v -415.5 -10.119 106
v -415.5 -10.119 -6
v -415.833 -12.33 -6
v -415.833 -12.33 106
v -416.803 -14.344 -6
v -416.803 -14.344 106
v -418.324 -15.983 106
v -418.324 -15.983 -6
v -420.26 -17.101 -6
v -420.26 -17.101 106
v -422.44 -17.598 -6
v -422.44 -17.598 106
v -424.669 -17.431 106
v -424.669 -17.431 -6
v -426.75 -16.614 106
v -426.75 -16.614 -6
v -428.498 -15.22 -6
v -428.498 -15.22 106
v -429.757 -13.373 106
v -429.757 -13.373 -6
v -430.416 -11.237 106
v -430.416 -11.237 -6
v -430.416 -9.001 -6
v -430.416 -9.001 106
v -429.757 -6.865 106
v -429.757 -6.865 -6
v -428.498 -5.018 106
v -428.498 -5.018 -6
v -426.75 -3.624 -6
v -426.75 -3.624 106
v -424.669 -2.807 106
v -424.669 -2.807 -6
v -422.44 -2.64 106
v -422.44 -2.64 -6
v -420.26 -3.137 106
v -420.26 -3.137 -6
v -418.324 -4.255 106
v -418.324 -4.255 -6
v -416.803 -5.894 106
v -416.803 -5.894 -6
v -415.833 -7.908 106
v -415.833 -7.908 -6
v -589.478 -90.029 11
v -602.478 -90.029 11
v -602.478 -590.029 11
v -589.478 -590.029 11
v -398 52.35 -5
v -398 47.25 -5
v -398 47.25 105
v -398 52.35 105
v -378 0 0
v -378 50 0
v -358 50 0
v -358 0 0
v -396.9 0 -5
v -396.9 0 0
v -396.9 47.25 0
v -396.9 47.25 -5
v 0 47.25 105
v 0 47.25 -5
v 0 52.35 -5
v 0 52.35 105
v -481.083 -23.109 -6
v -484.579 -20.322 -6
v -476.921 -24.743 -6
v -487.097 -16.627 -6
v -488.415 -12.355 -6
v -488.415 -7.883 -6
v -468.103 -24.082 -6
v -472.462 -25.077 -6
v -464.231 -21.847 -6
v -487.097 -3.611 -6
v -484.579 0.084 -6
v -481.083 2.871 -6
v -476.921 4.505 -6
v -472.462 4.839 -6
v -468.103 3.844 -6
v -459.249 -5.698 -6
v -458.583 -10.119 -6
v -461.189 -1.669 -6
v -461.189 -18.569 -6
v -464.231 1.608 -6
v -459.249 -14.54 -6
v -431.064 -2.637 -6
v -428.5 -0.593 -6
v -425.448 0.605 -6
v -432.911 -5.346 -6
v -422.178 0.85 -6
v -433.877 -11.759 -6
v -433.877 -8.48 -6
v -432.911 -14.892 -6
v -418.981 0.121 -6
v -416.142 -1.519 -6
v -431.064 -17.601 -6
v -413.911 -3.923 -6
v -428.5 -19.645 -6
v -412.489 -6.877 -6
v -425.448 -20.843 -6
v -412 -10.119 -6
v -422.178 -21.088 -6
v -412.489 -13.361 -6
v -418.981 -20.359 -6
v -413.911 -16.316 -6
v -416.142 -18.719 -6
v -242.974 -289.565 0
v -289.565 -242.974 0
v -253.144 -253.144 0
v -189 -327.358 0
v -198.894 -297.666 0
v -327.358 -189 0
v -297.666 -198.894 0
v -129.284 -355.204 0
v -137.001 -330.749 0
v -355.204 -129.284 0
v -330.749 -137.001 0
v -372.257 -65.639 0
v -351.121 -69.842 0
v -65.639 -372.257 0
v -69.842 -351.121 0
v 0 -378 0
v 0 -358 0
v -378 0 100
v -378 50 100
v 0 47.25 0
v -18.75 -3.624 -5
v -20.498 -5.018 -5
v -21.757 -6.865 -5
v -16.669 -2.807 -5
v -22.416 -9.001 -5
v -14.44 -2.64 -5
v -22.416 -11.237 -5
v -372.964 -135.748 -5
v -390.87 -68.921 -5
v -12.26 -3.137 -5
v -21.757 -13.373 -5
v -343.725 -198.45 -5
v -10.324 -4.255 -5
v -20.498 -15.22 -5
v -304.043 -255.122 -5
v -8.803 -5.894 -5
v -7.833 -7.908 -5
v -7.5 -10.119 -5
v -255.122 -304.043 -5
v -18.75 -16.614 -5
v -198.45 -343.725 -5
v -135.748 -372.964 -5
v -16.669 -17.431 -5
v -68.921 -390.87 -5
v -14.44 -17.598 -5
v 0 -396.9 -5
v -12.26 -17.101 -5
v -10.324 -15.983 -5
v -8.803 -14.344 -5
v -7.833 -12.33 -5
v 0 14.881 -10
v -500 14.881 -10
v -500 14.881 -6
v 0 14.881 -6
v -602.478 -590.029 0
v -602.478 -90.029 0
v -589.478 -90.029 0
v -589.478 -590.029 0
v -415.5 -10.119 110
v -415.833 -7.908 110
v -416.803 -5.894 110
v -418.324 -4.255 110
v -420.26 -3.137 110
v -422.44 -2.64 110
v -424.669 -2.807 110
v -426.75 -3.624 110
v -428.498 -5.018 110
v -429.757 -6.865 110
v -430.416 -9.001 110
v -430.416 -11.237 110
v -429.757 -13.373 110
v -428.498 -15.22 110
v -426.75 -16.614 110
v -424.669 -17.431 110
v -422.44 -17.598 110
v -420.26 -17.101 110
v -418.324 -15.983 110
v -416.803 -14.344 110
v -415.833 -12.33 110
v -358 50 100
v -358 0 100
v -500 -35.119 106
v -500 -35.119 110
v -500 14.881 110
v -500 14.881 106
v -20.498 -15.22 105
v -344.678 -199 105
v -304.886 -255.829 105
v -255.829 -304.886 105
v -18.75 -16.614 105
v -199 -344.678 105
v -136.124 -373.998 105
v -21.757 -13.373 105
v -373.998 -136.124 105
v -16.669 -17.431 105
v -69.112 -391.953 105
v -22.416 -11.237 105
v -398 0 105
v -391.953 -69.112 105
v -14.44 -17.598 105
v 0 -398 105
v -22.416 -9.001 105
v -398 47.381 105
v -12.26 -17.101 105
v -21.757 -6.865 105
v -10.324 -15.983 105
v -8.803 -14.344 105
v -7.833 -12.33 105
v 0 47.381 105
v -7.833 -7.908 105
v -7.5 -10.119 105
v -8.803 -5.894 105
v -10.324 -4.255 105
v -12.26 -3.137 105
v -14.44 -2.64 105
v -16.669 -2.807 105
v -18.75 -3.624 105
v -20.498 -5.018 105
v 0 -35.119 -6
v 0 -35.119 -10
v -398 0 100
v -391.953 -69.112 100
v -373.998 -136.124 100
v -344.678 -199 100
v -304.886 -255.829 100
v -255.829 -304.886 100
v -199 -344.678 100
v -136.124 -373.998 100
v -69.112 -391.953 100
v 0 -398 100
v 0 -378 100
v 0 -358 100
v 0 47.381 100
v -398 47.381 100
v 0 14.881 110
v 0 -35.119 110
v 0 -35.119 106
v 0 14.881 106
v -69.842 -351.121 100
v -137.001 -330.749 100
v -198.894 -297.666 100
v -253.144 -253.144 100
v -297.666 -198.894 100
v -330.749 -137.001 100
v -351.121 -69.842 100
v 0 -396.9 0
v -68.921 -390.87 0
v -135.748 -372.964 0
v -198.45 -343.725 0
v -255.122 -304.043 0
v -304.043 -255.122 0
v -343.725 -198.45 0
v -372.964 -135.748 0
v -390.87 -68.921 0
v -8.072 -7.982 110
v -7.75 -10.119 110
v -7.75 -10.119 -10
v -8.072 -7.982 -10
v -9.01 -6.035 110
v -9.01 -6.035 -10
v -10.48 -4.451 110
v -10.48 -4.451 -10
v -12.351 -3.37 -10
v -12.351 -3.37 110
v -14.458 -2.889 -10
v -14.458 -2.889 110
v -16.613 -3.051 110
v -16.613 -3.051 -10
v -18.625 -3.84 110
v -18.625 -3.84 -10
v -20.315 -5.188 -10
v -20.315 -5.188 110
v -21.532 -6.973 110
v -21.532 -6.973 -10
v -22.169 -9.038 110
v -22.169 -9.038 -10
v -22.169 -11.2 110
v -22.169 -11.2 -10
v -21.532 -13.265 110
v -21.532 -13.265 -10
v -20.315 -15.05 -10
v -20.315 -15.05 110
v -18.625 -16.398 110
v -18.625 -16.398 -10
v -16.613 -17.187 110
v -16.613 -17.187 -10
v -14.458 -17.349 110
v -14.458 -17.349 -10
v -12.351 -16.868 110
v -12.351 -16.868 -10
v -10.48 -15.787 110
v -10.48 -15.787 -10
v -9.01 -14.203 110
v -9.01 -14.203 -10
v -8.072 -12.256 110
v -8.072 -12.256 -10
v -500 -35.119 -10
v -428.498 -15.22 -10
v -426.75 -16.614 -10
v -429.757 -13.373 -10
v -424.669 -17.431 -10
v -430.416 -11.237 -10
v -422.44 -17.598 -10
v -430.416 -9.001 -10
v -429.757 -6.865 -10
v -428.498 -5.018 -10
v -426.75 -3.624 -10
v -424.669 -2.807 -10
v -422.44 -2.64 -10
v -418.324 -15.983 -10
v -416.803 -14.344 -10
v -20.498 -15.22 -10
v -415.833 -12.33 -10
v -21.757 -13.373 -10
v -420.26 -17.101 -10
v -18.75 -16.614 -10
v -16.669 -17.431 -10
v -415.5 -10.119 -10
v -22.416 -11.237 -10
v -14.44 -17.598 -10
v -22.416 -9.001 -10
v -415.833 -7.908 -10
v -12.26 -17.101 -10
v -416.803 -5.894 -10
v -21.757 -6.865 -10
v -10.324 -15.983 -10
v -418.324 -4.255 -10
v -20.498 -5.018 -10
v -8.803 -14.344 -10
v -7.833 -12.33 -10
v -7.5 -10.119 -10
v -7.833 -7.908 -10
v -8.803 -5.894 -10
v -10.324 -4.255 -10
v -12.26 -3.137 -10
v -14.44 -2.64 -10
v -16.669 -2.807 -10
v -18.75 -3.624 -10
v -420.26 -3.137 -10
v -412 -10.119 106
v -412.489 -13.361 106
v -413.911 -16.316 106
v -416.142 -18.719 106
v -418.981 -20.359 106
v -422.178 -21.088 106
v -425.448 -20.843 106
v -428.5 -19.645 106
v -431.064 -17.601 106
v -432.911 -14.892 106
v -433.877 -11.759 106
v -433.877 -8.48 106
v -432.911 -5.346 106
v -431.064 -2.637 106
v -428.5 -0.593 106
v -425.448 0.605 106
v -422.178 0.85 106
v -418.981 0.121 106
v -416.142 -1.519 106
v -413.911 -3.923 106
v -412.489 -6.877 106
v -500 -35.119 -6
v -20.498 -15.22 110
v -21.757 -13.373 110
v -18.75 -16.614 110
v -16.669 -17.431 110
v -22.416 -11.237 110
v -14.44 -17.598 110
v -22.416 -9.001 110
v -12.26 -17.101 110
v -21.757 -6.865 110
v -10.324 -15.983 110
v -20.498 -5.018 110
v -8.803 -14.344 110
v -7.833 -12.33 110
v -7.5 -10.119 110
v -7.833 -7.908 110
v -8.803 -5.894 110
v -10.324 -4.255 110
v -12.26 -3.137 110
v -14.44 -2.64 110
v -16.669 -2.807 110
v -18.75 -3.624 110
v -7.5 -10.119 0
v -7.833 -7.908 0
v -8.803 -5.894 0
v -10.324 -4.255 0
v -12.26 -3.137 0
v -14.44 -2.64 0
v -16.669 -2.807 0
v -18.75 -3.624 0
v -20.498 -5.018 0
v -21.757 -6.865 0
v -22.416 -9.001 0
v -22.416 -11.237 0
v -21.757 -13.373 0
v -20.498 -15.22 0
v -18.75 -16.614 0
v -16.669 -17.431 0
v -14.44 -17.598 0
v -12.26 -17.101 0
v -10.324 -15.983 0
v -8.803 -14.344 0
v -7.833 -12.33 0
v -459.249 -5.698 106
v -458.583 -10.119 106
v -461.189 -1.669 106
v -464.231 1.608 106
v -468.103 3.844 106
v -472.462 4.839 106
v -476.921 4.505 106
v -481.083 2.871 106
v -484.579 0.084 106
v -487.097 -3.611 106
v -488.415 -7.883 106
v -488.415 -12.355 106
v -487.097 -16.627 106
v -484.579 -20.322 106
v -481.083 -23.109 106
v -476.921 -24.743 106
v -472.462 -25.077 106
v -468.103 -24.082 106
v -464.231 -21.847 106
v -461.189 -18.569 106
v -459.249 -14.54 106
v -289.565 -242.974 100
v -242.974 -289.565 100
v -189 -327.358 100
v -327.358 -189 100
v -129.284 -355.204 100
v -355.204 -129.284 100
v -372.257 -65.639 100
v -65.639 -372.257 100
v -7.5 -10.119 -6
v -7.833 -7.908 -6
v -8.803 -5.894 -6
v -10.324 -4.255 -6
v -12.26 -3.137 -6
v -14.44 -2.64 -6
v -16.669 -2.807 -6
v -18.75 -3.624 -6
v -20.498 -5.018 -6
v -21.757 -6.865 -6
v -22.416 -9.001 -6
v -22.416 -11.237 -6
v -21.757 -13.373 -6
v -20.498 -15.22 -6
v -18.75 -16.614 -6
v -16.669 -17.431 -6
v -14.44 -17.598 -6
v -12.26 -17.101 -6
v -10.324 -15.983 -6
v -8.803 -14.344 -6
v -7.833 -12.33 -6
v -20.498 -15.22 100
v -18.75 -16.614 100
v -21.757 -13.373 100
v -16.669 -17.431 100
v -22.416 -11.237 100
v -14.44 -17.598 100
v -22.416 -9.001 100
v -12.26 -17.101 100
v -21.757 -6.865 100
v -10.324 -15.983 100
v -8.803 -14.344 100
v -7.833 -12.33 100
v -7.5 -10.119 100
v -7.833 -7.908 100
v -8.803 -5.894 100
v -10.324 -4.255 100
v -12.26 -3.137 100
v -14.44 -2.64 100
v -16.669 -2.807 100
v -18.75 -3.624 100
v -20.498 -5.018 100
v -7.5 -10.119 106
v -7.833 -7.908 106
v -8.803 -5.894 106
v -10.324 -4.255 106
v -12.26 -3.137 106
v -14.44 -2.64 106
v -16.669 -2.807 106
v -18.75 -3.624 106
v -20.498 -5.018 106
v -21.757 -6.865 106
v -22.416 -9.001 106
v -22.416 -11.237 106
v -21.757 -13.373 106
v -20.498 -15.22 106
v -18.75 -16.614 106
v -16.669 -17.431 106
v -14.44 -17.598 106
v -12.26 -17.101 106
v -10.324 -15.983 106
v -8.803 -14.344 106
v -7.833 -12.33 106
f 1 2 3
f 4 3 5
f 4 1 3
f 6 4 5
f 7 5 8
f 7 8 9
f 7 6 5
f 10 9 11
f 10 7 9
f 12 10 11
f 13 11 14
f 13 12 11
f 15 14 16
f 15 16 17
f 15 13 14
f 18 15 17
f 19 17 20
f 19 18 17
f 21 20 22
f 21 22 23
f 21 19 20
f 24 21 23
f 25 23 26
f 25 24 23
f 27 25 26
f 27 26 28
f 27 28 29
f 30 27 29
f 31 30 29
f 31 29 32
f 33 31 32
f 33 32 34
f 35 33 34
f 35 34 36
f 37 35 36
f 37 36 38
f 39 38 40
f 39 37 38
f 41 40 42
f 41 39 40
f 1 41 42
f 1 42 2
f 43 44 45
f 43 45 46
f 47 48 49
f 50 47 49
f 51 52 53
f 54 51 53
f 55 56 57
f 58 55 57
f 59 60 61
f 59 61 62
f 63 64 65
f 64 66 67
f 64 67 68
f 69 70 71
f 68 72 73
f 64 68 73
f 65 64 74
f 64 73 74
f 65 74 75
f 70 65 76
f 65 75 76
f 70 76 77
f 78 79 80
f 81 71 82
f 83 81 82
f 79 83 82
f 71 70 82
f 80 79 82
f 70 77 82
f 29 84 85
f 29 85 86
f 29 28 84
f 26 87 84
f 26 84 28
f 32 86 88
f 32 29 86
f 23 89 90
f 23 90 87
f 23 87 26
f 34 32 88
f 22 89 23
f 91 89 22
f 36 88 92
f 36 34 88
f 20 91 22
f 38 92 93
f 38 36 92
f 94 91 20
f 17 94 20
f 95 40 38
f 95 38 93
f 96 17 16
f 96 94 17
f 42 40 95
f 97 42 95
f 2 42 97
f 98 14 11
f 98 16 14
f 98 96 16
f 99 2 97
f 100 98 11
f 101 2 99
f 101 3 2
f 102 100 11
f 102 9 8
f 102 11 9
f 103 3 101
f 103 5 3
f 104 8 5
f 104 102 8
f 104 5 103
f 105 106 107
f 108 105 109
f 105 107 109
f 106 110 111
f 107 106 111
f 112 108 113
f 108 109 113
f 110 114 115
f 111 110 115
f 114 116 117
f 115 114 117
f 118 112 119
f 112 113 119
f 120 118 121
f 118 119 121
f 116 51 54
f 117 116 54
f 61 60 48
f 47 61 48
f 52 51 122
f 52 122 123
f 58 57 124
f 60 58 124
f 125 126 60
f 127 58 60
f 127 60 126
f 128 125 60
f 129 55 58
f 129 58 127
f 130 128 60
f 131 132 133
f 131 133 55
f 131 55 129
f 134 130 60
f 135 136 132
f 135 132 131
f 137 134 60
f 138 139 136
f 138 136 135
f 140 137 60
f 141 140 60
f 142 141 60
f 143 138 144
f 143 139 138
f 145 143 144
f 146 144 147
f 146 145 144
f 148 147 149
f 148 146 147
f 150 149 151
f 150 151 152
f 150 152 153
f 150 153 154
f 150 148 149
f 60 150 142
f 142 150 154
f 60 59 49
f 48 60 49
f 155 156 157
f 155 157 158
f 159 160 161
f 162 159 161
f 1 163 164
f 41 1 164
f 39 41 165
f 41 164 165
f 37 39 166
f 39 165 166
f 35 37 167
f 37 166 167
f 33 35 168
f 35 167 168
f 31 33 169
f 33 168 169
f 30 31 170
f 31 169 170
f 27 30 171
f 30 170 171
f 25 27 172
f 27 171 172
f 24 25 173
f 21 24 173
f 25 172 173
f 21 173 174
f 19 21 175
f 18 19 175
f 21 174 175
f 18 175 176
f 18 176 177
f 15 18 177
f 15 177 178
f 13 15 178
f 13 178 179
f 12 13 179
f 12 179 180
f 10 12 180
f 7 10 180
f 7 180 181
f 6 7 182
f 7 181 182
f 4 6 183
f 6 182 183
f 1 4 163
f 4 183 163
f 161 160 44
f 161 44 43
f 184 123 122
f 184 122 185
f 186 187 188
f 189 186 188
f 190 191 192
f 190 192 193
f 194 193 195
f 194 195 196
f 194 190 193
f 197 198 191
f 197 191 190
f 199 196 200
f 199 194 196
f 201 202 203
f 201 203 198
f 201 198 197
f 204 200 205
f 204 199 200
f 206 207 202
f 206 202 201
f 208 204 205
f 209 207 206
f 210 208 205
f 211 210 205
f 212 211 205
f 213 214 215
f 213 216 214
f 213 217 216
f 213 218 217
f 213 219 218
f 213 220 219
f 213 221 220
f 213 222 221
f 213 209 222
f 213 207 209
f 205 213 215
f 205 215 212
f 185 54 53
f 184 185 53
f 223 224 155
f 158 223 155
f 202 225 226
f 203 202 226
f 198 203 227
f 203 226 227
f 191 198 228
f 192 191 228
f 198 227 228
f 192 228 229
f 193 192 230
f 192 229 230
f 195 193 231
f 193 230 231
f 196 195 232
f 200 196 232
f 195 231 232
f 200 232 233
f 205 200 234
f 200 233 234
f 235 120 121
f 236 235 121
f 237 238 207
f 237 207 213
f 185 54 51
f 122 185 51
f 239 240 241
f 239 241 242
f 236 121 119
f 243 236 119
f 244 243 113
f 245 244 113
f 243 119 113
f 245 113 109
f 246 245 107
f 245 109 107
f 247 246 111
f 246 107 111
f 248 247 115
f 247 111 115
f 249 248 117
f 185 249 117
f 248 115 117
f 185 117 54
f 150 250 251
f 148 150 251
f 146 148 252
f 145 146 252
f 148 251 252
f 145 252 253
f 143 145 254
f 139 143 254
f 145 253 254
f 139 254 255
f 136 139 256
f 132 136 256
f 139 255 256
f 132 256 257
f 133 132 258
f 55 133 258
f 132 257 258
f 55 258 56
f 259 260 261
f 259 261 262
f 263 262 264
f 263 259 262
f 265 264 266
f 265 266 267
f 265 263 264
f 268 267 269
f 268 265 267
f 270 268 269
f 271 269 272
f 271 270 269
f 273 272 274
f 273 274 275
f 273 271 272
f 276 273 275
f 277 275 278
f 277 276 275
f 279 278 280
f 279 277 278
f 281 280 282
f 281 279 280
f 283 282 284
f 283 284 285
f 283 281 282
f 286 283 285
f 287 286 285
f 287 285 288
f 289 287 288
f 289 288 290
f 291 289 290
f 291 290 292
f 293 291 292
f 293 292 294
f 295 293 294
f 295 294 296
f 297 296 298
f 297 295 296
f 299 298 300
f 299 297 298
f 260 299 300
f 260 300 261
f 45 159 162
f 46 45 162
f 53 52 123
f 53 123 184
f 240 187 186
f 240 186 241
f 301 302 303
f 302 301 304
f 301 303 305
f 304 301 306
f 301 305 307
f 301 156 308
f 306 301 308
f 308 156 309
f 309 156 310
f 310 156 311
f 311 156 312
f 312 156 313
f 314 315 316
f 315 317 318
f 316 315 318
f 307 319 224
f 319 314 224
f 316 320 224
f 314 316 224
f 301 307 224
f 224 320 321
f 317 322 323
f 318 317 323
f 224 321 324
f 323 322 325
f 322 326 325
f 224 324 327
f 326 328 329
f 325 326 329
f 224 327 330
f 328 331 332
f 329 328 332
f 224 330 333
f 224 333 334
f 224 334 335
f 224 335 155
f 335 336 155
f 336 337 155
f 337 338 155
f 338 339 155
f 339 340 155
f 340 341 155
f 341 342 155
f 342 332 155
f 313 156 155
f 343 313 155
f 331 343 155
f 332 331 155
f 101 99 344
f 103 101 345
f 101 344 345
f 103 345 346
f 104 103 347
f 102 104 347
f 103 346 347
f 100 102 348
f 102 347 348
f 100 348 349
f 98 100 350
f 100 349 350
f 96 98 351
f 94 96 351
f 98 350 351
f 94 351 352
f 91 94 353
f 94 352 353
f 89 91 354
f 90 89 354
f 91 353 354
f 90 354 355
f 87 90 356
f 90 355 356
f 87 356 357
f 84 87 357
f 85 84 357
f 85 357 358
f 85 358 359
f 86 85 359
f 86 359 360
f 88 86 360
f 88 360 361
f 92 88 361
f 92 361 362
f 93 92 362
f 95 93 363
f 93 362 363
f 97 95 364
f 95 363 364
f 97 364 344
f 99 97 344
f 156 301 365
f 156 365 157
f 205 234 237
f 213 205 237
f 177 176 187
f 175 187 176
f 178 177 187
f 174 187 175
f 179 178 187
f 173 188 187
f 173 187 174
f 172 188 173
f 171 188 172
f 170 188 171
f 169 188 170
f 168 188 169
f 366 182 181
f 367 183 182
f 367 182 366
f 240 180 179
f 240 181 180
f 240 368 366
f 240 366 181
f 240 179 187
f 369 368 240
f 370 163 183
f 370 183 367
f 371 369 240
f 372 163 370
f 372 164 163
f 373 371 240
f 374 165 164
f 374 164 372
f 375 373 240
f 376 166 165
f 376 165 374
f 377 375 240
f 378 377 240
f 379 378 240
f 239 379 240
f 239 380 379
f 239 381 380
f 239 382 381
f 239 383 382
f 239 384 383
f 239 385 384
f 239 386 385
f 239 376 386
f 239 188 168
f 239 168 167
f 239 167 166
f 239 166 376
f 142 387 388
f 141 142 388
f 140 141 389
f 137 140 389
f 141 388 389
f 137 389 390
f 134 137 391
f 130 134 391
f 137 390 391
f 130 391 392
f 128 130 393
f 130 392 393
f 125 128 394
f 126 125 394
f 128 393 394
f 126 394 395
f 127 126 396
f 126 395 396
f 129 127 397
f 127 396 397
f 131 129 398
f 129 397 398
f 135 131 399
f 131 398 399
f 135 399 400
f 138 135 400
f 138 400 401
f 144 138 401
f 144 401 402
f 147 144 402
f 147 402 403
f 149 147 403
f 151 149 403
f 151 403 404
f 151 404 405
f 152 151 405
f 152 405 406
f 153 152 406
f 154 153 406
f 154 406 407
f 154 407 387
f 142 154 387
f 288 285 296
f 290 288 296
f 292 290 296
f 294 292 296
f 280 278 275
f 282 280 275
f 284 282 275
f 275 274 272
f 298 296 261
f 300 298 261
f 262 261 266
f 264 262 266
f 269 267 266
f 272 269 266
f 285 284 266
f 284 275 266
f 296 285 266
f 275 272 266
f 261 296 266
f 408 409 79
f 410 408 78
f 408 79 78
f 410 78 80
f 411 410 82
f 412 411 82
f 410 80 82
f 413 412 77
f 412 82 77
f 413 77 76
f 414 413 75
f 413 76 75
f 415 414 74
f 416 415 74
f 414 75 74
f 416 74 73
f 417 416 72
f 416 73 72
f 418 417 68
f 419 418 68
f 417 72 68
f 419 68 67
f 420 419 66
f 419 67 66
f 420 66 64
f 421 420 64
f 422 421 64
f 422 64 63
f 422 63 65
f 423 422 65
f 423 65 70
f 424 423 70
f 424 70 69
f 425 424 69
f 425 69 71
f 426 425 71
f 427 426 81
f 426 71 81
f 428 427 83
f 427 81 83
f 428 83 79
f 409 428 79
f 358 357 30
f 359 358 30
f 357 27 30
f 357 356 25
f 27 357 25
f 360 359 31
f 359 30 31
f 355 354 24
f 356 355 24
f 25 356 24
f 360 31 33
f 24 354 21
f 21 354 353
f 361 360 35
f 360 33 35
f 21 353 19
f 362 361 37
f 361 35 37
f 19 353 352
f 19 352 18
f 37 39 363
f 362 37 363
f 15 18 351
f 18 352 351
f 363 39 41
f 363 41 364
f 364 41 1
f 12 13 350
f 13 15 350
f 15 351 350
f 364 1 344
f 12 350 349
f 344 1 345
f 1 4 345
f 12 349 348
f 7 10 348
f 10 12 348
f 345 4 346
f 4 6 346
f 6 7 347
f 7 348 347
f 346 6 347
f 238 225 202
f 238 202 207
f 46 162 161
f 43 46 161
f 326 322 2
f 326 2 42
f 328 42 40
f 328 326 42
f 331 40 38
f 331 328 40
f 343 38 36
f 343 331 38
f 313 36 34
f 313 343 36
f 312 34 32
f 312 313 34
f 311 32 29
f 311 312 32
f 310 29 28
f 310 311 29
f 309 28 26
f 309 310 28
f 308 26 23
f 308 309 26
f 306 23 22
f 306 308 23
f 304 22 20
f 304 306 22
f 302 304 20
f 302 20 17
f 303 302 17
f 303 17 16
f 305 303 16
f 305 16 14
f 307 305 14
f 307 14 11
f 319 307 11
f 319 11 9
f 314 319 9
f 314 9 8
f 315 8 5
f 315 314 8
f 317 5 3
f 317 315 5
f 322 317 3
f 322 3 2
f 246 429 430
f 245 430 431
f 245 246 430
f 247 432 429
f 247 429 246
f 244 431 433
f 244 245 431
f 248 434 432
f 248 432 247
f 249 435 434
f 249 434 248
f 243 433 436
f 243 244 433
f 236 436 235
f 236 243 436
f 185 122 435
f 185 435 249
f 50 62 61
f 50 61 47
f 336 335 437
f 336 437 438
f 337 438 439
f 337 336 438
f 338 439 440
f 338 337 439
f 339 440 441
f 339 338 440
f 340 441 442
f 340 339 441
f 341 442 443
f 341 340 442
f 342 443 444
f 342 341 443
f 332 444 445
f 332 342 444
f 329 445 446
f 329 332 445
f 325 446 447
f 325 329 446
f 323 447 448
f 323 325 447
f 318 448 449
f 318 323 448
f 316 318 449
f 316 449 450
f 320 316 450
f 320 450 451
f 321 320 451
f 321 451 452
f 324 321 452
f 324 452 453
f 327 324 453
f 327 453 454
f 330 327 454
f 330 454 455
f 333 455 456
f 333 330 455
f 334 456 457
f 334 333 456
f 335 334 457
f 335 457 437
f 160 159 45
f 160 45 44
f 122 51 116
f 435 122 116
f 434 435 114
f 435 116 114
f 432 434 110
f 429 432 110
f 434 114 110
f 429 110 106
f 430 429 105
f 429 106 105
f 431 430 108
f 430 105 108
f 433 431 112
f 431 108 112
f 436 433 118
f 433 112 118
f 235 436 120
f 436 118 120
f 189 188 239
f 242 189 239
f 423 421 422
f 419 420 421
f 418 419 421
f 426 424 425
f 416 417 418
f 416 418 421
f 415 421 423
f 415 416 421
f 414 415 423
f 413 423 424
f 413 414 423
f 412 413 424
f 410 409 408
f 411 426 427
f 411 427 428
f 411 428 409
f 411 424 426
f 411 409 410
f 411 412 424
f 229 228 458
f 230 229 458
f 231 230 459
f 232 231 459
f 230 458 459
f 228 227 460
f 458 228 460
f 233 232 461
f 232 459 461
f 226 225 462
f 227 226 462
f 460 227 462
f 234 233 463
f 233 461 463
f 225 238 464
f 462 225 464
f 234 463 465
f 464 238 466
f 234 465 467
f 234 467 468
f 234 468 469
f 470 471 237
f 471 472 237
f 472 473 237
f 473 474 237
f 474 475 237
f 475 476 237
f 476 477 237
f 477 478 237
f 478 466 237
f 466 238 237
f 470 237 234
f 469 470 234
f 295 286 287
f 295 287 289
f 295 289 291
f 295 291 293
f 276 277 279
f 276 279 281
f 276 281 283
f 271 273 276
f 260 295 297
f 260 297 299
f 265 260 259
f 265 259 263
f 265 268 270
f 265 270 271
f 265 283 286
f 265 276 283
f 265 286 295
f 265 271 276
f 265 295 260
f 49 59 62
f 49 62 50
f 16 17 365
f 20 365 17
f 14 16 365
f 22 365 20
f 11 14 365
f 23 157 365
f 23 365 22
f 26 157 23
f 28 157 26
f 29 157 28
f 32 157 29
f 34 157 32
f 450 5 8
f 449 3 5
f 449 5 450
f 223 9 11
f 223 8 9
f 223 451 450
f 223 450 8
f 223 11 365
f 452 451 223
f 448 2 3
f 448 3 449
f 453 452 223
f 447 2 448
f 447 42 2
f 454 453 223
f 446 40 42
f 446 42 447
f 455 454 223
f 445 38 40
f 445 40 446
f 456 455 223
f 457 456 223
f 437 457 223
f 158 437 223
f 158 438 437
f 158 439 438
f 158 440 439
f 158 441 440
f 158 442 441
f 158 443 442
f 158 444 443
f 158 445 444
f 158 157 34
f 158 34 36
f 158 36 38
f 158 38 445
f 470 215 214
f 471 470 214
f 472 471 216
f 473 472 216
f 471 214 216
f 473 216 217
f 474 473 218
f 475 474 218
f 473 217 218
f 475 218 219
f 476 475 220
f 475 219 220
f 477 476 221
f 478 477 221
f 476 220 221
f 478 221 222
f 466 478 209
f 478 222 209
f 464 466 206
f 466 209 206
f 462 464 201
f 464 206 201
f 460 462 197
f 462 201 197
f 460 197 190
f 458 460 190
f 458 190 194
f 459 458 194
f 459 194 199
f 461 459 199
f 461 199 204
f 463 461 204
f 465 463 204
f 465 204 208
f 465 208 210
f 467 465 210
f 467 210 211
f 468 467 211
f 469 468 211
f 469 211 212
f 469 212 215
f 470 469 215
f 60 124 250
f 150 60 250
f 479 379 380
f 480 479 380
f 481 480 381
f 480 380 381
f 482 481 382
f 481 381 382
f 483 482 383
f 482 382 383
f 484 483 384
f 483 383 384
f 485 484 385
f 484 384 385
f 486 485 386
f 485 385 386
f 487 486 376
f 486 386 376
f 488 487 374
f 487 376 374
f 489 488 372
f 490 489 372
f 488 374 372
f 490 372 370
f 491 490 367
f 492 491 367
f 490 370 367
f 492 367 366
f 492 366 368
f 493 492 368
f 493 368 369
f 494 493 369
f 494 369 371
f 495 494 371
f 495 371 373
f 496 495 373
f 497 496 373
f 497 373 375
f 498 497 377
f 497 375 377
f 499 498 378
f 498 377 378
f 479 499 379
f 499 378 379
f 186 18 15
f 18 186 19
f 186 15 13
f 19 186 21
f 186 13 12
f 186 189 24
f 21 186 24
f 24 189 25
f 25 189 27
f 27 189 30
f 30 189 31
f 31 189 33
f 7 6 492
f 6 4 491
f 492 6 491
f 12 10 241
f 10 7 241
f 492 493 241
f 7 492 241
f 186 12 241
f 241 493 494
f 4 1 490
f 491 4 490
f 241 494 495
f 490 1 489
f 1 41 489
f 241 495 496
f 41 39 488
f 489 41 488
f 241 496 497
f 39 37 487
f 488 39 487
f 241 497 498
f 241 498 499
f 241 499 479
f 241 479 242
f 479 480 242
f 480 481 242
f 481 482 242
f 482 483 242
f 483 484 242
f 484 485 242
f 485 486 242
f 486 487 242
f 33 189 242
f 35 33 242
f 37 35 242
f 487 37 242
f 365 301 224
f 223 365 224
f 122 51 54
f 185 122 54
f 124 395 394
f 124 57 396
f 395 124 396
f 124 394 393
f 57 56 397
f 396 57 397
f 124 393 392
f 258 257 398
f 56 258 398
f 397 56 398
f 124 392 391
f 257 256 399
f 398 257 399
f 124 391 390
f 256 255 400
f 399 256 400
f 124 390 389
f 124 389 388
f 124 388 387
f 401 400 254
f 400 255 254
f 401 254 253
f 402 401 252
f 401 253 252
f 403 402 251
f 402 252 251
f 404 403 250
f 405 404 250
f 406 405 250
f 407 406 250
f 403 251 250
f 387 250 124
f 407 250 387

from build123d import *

# Parameters (mm, degrees)
F1_DEPTH  = 100
F4_DEPTH  = 5
F6_W      = 398
F6_H      = 47.380952381
F7_DEPTH  = 5
F9_W      = 398
F9_H      = 110
F10_DEPTH = 5.1
F11_R     = 7.5
F12_DEPTH = 110.001
F14_R     = 7.25
F15_DEPTH = 120
F17_W     = 500
F17_H     = 50
F17_R     = 7.5
F18_DEPTH = 4
F0_W      = 20
F0_H      = 50
F21_DEPTH = 100
F22_R     = 15
F23_DEPTH = 112
F24_R     = 11
F24_R_2   = 7.5
F25_DEPTH = 112
F26_W     = 13
F26_H     = 500
F27_DEPTH = 11


# Not quite as in the source:
# - a feature names something its author has since deleted; it is built from what else it names


with BuildPart() as f1:
    # F0 (on Top) → F1 (new body)
    with BuildSketch(Plane.XY):
        with BuildLine():
            ThreePointArc((0, -358), (-253.1442276648, -253.1442276648), (-358, 0))
            Line((-358, 0), (-378, 0))
            ThreePointArc((-378, 0), (-267.2863632885, -267.2863632885), (0, -378))
            Line((0, -378), (0, -358))
        make_face()
    extrude(amount=F1_DEPTH)


with BuildPart() as f4:
    # F3 (on offset) → F4 (new body)
    with BuildSketch(Plane(origin=(0, 0, 0), x_dir=(1, 0, 0), z_dir=(0, 0, -1))):
        with BuildLine():
            Line((-378, 0), (0, 0))
            Line((0, 0), (0, 378))
            ThreePointArc((0, 378), (-267.2863632885, 267.2863632885), (-378, 0))
        make_face()
        Polygon((0, -47.25), (0, 0), (-378, 0), (-396.9, 0), (-396.9, -47.25), align=None)
        with BuildLine():
            ThreePointArc((-378, 0), (-267.2863632885, 267.2863632885), (0, 378))
            Line((0, 378), (0, 396.9))
            ThreePointArc((0, 396.9), (-280.6506814529, 280.6506814529), (-396.9, 0))
            Line((-396.9, 0), (-378, 0))
        make_face()
    extrude(amount=F4_DEPTH)


with BuildPart() as f7:
    # F6 (on offset) → F7 (new body)
    with BuildSketch(Plane.XY.offset(100)):
        with BuildLine():
            Line((0, -398), (0, 0))
            Line((0, 0), (-398, 0))
            ThreePointArc((-398, 0), (-281.4284989122, -281.4284989122), (0, -398))
        make_face()
        with Locations((-199, 23.6904761905)):
            Rectangle(F6_W, F6_H)
    extrude(amount=F7_DEPTH)


with BuildPart() as f10:
    # F9 (on offset) → F10 (new body)
    with BuildSketch(Plane(origin=(0, 47.25, 0), x_dir=(-1, 0, 0), z_dir=(0, 1, 0))):
        with Locations((199, 50)):
            Rectangle(F9_W, F9_H)
    extrude(amount=F10_DEPTH)


with BuildPart() as f12_tool:
    # F11 (on face) → F12 (new body, through all)
    with BuildSketch(Plane.XY.offset(105)):
        with Locations((-15, -10.119047619)):
            Circle(F11_R)
    extrude(amount=-F12_DEPTH)


with BuildPart() as f4_1:
    add(f4.part)

    # F12: cut by f12_tool
    add(f12_tool.part, mode=Mode.SUBTRACT)


with BuildPart() as f7_1:
    add(f7.part)

    # F12: cut by f12_tool
    add(f12_tool.part, mode=Mode.SUBTRACT)


with BuildPart() as f15:
    # F14 (on offset) → F15 (new body)
    with BuildSketch(Plane.XY.offset(110)):
        with Locations((-15, -10.119047619)):
            Circle(F14_R)
    extrude(amount=-F15_DEPTH)


with BuildPart() as f18:
    # F17 (on offset) → F18 (new body)
    with BuildSketch(Plane.XY.offset(110)):
        with Locations((-250, -10.119047619)):
            Rectangle(F17_W, F17_H)
        with Locations((-423, -10.119047619)):
            Circle(F17_R, mode=Mode.SUBTRACT)
        with Locations((-15, -10.119047619)):
            Circle(F17_R, mode=Mode.SUBTRACT)
    extrude(amount=-F18_DEPTH)


with BuildPart() as f20_1:
    # F20: instance of F18
    add(f18.part.mirror(Plane(origin=(-234.3337410657, -234.3337410657, 50), x_dir=(1, 0, 0), z_dir=(0, 0, 1))))


with BuildPart() as f21:
    # F0 (on Top) → F21 (new body)
    with BuildSketch(Plane.XY):
        with Locations((-368, 25)):
            Rectangle(F0_W, F0_H)
    extrude(amount=F21_DEPTH)


with BuildPart() as f23:
    # F22 (on face) → F23 (new body, through all)
    with BuildSketch(Plane.XY.offset(-6)):
        with Locations((-473.5828638077, -10.119047619)):
            Circle(F22_R)
    extrude(amount=F23_DEPTH)


with BuildPart() as f25:
    # F24 (on face) → F25 (new body, through all)
    with BuildSketch(Plane(origin=(0, 0, 106), x_dir=(1, 0, 0), z_dir=(0, 0, -1))):
        with Locations((-423, 10.119047619)):
            Circle(F24_R)
        with Locations((-423, 10.119047619)):
            Circle(F24_R_2, mode=Mode.SUBTRACT)
    extrude(amount=F25_DEPTH)


with BuildPart() as f27:
    # F26 (on Top) → F27 (new body)
    with BuildSketch(Plane.XY):
        with Locations((-595.9782657623, -340.0288820267)):
            Rectangle(F26_W, F26_H)
    extrude(amount=F27_DEPTH)


solid = Compound([f1.part, f10.part, f4_1.part, f7_1.part, f15.part, f18.part, f20_1.part, f21.part, f23.part, f25.part, f27.part])
